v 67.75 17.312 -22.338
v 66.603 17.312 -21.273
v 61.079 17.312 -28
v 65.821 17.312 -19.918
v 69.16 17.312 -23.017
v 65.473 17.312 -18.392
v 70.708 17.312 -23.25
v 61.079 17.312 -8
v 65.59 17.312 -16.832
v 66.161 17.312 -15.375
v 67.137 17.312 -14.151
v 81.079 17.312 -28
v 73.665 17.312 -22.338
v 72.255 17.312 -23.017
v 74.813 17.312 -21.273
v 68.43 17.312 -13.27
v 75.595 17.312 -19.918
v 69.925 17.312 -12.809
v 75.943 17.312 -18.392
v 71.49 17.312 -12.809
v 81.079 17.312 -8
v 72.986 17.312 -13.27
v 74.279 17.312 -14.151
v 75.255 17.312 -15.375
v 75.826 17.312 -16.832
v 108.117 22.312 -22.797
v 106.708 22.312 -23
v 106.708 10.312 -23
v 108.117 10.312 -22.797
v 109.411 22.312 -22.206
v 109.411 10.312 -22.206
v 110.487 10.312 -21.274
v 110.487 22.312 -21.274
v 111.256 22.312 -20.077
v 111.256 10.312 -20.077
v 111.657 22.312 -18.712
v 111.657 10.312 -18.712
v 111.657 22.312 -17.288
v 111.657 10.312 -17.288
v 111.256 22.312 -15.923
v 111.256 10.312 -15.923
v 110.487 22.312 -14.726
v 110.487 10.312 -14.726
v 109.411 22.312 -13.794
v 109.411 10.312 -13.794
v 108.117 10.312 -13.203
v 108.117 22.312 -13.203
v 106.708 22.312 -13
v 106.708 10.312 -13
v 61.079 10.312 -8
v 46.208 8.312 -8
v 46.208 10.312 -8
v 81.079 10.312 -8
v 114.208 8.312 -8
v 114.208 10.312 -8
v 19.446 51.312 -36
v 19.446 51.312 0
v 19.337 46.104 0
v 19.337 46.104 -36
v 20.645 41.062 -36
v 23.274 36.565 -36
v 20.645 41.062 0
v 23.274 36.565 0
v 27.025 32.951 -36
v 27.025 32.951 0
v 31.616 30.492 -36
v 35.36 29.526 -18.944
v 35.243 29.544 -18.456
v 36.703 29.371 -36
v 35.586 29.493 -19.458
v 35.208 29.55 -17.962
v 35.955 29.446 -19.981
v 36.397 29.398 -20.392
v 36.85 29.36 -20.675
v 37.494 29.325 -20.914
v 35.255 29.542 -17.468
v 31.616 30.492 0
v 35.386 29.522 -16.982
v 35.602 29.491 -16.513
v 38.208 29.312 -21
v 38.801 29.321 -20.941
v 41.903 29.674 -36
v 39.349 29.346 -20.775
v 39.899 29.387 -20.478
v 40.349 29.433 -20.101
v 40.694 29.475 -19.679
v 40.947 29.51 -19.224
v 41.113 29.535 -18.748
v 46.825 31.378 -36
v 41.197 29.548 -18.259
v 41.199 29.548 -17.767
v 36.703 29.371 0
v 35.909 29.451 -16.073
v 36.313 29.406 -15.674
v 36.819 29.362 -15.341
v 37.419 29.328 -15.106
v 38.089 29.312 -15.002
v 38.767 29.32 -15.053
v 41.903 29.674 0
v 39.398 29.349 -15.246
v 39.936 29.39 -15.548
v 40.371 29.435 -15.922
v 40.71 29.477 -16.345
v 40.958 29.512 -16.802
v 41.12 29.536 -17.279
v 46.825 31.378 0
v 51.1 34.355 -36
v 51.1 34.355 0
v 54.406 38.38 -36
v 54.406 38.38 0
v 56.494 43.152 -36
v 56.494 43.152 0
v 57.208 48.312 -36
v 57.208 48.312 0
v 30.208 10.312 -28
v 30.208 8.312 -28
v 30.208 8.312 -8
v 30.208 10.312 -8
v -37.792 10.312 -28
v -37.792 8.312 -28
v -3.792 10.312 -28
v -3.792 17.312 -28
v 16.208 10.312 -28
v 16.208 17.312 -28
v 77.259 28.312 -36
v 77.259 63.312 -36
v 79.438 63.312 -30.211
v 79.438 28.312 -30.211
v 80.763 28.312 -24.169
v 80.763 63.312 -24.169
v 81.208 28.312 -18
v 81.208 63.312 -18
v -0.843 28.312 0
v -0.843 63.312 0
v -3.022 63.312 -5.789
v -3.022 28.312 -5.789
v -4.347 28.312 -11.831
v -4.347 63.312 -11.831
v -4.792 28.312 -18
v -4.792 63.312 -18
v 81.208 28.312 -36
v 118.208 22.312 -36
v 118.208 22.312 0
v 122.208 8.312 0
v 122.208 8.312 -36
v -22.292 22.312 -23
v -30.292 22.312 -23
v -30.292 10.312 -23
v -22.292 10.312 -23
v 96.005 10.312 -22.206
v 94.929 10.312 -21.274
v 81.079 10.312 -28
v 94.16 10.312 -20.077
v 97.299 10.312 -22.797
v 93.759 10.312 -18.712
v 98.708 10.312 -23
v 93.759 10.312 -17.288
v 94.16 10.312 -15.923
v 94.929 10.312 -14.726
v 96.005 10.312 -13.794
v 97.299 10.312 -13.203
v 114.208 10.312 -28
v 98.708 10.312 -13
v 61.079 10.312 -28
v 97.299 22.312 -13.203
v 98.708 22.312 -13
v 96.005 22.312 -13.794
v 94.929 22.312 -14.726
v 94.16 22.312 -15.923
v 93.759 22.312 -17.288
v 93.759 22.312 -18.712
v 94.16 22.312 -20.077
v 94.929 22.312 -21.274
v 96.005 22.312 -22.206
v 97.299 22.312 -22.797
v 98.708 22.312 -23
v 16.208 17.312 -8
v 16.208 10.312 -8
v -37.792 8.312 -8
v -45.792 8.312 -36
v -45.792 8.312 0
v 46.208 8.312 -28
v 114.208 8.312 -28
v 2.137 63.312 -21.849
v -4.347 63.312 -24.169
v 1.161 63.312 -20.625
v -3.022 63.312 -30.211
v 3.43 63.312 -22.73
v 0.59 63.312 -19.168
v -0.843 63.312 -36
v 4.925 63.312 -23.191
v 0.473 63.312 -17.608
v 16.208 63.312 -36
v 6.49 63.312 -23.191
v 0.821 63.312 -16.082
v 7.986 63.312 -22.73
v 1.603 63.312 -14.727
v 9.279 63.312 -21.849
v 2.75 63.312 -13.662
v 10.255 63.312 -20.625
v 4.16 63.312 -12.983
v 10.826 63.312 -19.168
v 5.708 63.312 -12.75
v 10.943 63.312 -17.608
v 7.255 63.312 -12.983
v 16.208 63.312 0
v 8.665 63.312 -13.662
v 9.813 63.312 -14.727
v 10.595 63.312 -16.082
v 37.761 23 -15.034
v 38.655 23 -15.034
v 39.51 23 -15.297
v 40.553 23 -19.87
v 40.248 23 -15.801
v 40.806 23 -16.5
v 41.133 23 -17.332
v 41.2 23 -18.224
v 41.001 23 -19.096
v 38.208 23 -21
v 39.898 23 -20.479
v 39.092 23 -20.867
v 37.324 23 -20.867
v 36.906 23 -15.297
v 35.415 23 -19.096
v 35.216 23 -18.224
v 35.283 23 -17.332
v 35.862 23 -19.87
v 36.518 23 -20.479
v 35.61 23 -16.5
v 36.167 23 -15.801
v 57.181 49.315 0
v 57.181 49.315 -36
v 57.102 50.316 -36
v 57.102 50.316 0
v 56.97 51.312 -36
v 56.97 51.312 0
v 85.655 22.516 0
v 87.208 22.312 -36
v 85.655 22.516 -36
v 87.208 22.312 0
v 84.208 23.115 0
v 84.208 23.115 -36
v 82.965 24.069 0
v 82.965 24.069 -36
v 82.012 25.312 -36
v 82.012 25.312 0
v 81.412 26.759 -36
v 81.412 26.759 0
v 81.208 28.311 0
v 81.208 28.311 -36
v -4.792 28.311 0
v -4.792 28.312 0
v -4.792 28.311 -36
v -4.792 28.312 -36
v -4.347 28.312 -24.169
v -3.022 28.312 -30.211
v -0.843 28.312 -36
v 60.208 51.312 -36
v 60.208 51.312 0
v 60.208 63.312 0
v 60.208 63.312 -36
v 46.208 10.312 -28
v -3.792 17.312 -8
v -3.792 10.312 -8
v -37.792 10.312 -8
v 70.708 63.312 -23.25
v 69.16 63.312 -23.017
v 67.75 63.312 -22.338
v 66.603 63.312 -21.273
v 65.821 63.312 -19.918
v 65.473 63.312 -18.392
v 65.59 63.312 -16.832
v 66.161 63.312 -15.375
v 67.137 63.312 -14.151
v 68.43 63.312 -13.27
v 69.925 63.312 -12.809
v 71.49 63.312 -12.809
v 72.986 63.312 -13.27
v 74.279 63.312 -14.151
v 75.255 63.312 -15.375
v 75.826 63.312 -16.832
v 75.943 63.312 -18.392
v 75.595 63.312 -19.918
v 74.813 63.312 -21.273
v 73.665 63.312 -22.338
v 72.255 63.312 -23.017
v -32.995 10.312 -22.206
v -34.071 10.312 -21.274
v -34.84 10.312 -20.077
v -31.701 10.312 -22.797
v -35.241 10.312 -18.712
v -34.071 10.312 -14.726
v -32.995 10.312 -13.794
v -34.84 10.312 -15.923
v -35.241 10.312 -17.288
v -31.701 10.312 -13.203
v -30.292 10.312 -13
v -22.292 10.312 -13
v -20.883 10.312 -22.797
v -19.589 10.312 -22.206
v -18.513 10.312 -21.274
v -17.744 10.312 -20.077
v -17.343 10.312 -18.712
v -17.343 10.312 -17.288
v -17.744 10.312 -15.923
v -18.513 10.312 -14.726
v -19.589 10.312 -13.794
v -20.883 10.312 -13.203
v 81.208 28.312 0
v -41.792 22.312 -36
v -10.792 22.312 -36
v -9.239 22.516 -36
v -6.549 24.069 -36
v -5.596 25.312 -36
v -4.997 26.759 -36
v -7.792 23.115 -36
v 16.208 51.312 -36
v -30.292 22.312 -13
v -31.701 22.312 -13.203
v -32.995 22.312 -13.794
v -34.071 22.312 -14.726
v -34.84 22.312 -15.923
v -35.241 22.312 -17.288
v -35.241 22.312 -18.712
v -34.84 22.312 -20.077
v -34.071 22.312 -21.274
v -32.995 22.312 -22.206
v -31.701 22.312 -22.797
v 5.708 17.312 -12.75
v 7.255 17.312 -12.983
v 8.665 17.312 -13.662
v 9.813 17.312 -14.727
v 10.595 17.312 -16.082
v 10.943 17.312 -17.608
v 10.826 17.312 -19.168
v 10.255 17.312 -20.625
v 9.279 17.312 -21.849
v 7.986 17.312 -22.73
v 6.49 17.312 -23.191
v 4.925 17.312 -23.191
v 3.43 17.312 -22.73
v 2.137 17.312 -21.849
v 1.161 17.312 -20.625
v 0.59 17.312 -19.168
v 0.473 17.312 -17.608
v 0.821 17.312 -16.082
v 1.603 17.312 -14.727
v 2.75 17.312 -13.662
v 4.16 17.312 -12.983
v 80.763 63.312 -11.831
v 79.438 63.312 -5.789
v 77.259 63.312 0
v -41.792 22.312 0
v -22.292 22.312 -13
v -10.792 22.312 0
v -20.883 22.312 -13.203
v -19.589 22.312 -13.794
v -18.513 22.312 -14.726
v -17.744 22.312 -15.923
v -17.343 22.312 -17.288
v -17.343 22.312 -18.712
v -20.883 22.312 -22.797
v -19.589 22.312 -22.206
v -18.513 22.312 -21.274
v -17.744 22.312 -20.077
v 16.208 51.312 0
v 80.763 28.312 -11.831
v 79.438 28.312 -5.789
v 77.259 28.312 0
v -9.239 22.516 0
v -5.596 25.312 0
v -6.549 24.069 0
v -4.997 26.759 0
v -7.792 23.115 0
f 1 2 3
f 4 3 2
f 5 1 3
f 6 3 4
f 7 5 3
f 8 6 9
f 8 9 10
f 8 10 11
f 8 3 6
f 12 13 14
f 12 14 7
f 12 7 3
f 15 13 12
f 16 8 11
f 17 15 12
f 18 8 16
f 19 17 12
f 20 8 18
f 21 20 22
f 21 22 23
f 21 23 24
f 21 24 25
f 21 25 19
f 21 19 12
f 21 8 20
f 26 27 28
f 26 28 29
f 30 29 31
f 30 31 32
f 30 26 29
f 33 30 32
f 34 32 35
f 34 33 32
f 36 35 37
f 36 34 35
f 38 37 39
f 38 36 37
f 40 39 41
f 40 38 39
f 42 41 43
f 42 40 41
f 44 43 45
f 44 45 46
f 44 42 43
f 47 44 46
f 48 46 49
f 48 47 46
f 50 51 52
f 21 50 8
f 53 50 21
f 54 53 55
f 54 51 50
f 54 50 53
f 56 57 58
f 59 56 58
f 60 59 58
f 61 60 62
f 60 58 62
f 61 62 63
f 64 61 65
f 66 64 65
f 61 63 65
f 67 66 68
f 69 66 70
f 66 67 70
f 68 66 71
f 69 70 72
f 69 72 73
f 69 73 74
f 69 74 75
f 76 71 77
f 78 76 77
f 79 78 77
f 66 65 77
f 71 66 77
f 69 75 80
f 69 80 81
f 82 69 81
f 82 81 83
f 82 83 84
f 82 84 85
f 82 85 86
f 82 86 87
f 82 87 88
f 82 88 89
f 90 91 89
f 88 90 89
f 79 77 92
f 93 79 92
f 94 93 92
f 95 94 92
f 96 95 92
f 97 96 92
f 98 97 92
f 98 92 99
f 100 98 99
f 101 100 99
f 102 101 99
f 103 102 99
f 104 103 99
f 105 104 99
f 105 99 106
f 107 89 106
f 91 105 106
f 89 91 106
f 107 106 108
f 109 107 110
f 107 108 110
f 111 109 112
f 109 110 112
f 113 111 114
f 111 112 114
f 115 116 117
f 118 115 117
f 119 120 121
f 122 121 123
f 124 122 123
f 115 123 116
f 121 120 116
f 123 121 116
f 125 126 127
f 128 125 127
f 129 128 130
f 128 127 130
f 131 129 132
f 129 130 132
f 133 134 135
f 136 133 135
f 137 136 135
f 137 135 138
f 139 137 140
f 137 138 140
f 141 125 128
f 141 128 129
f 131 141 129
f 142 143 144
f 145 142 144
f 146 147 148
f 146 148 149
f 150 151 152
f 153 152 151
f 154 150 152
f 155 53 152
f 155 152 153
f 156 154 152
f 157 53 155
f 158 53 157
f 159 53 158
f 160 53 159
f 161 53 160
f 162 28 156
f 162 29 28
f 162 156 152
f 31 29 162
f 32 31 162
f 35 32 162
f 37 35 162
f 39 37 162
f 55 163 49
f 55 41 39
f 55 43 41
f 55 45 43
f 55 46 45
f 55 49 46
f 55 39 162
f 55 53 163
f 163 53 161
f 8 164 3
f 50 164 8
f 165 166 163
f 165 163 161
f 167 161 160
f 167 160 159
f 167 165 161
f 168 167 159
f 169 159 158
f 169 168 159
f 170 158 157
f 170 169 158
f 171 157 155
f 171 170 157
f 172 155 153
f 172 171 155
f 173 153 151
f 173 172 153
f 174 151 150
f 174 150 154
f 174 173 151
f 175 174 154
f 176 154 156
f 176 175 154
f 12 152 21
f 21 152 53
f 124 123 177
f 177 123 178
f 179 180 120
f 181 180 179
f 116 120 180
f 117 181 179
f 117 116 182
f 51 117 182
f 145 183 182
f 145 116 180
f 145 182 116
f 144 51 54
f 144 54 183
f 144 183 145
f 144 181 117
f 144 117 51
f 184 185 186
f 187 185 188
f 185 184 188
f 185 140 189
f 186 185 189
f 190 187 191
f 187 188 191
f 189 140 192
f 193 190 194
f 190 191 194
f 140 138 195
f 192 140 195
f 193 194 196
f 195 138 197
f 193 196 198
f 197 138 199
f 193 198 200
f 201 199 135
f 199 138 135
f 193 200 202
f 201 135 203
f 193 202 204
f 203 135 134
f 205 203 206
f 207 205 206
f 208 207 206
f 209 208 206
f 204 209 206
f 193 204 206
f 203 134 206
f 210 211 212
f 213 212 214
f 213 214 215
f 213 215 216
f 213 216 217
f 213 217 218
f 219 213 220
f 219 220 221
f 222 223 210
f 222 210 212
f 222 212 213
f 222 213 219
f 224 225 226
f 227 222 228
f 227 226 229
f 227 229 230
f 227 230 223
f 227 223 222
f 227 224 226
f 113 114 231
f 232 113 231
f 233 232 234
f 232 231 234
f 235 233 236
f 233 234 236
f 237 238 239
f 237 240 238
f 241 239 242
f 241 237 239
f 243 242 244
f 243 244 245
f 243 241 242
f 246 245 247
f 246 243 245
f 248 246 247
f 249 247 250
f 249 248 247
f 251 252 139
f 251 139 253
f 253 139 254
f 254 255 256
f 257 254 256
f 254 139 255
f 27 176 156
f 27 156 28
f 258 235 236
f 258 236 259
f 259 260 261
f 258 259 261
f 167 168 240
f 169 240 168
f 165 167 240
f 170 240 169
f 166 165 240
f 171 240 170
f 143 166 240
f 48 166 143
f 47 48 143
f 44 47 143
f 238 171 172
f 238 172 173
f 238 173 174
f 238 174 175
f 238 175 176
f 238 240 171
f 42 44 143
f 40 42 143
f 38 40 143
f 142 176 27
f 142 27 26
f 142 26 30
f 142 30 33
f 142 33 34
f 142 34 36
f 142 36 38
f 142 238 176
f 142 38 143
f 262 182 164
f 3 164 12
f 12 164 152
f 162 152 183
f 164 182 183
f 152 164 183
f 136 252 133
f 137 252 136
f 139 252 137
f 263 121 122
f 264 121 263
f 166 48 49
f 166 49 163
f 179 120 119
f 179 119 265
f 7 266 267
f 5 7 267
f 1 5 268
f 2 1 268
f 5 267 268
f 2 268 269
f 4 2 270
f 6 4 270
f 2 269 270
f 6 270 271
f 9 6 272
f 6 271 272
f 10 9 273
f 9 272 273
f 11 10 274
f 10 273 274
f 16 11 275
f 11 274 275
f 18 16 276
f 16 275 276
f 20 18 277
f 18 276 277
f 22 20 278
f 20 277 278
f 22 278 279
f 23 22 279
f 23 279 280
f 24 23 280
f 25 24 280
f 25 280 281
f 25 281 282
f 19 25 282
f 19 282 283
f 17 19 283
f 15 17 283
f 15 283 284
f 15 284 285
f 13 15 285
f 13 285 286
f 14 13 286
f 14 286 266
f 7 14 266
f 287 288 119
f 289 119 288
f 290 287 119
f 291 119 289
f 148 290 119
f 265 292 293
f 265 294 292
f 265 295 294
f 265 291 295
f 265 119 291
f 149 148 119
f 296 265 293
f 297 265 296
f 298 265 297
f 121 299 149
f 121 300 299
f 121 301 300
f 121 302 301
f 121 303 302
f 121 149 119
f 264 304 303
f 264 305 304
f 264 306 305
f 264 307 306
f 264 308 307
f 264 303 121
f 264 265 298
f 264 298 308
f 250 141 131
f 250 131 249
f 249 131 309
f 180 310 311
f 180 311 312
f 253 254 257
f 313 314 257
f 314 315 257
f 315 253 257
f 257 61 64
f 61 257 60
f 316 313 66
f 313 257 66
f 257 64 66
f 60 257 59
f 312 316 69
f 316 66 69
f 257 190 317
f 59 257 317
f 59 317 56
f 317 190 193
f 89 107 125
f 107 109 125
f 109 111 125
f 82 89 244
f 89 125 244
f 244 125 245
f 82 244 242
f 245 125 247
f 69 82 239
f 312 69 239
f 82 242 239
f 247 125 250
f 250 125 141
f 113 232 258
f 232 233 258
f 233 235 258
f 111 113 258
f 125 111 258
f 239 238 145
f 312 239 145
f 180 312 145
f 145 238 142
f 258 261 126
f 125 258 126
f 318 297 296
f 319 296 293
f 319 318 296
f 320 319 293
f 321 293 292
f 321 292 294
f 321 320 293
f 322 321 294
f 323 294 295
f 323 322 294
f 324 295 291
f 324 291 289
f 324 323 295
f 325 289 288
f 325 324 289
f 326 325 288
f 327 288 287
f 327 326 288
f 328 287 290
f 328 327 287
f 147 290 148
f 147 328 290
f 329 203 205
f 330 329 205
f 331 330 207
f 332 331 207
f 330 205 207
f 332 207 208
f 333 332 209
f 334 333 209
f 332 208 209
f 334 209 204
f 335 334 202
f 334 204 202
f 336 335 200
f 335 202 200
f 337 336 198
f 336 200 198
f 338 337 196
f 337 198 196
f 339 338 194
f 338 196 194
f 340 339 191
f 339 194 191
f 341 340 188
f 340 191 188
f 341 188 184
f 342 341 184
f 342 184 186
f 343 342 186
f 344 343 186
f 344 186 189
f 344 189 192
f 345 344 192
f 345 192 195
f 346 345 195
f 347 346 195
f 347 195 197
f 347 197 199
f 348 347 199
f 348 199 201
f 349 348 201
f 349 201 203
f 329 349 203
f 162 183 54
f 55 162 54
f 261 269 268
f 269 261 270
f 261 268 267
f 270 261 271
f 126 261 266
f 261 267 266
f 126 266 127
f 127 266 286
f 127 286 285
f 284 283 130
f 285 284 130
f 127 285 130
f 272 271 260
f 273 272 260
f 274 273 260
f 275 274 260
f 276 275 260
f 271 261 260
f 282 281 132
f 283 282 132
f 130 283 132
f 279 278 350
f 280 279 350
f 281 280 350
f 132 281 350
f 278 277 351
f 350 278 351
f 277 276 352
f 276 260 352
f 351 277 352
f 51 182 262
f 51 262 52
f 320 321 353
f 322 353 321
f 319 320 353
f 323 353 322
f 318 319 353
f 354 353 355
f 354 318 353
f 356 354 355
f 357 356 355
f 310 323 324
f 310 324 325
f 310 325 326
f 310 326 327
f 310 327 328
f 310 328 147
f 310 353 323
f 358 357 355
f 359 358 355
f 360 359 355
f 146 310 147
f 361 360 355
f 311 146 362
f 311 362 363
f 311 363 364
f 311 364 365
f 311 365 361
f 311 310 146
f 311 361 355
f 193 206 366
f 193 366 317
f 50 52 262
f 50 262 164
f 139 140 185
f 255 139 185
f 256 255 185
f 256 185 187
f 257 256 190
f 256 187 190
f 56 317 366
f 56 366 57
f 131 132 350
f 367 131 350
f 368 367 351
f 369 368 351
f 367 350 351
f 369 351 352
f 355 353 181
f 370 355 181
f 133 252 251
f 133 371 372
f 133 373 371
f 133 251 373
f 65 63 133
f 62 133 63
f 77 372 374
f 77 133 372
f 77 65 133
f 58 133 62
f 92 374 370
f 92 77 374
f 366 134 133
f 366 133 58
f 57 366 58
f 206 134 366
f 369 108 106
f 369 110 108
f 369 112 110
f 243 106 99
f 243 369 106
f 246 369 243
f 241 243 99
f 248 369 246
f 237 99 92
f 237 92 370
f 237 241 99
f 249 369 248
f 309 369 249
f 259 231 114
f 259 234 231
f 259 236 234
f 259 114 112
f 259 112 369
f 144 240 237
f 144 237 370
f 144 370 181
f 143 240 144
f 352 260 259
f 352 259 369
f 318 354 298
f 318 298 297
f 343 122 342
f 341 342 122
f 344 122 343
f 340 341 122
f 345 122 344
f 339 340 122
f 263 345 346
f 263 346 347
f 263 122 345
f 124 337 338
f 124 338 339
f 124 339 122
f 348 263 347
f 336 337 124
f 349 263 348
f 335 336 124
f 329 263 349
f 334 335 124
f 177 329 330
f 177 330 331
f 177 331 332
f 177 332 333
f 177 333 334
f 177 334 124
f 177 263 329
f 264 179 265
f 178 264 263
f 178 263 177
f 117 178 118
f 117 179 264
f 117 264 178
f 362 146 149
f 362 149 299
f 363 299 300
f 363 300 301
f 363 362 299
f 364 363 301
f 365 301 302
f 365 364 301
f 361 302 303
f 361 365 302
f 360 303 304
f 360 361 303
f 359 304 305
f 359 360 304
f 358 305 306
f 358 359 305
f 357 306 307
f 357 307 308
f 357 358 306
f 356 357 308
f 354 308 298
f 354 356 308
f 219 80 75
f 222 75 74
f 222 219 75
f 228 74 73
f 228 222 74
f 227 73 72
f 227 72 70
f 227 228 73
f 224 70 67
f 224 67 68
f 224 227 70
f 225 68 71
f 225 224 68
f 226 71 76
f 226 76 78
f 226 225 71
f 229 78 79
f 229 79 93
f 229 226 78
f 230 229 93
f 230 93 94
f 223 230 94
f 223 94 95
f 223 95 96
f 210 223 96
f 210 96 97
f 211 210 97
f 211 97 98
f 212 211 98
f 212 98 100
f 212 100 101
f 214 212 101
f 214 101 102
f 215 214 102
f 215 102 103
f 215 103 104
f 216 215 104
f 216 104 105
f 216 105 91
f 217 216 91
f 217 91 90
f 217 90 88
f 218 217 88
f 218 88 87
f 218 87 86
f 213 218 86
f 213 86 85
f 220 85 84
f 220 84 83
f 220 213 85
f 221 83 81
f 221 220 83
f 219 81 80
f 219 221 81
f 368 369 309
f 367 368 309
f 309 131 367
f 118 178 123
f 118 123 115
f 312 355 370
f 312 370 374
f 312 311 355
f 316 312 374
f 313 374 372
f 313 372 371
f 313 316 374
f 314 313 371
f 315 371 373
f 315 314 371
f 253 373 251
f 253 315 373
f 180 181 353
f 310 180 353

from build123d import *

# Parameters (mm, degrees)
SKETCH1_W                = 168
SKETCH1_H                = 55
BOSS_EXTRUDE2_DEPTH      = 36
CUT_EXTRUDE2_DEPTH       = 41
CUT_EXTRUDE4_DEPTH       = 35
SKETCH5_W                = 44
SKETCH5_H                = 36
CUT_EXTRUDE5_DEPTH       = 12
CUT_EXTRUDE6_DEPTH       = 42
SKETCH11_R               = 5.25
CUT_EXTRUDE8_DEPTH       = 53
CUT_EXTRUDE9_DEPTH       = 46
FILLET1_R                = 6
SKETCH30_W               = 68
SKETCH30_H               = 20
CUT_EXTRUDE14_DEPTH      = 2
CUT_EXTRUDE16_DEPTH      = 6
CUT_EXTRUDE16_DEPTH_BACK = 6
SKETCH31_R               = 3
SKETCH32_W               = 20
SKETCH32_H               = 20
CUT_EXTRUDE19_DEPTH      = 7
CUT_EXTRUDE21_DEPTH      = 12


with BuildPart() as part:
    # Sketch1 → Boss-Extrude2 (new body)
    with BuildSketch(Plane.XY):
        with Locations((38.207905975, 35.811584747)):
            Rectangle(SKETCH1_W, SKETCH1_H)
    extrude(amount=-BOSS_EXTRUDE2_DEPTH)

    # Sketch3 → Cut-Extrude2 (cut)
    with BuildSketch(Plane(origin=(0, 63.311584747, 0), x_dir=(1, 0, 0), z_dir=(0, 1, 0))):
        Polygon((122.207905975, 36), (81.207905975, 36), (81.207905975, 18.000000234), (81.207905975, 0), (122.207905975, 0), align=None)
        Polygon((-4.792094025, 18), (-4.792094025, 36), (-45.792094025, 36), (-45.792094025, 0), (-4.792094025, 0), align=None)
    extrude(amount=-CUT_EXTRUDE2_DEPTH, mode=Mode.SUBTRACT)

    # Sketch4 → Cut-Extrude4 (cut)
    with BuildSketch(Plane(origin=(0, 63.311584747, 0), x_dir=(1, 0, 0), z_dir=(0, 1, 0))):
        with BuildLine():
            Line((-0.843342405, 36), (-4.792094025, 36))
            Line((-4.792094025, 36), (-4.792094025, 18))
            ThreePointArc((-4.792094025, 18), (-3.793306391, 27.214019744), (-0.843342405, 36))
        make_face()
        with BuildLine():
            ThreePointArc((-0.843342405, 0), (-3.793306391, 8.785980256), (-4.792094025, 18))
            Line((-4.792094025, 18), (-4.792094025, 0))
            Line((-4.792094025, 0), (-0.843342405, 0))
        make_face()
        with BuildLine():
            Line((81.207905975, 36), (77.259154354, 36))
            ThreePointArc((77.259154354, 36), (80.20911834, 27.214019744), (81.207905975, 18))
            Line((81.207905975, 18), (81.207905975, 36))
        make_face()
        with BuildLine():
            ThreePointArc((81.207905975, 18), (80.20911834, 8.785980256), (77.259154354, 0))
            Line((77.259154354, 0), (81.207905975, 0))
            Line((81.207905975, 0), (81.207905975, 18))
        make_face()
    extrude(amount=-CUT_EXTRUDE4_DEPTH, mode=Mode.SUBTRACT)

    # Sketch5 → Cut-Extrude5 (cut)
    with BuildSketch(Plane(origin=(0, 63.311584747, 0), x_dir=(1, 0, 0), z_dir=(0, 1, 0))):
        with Locations((38.207905975, 18)):
            Rectangle(SKETCH5_W, SKETCH5_H)
    extrude(amount=-CUT_EXTRUDE5_DEPTH, mode=Mode.SUBTRACT)

    # Sketch8 → Cut-Extrude6 (cut)
    with BuildSketch(Plane.XY):
        with BuildLine():
            ThreePointArc((19.446242935, 51.311584747), (36.703179712, 29.37126271), (57.207905975, 48.311584747))
            ThreePointArc((57.207905975, 48.311584747), (57.148228012, 49.81631101), (56.969569014, 51.311584747))
            Line((56.969569014, 51.311584747), (19.446242935, 51.311584747))
        make_face()
        with BuildLine():
            Line((19.446242935, 51.311584747), (56.969569014, 51.311584747))
            ThreePointArc((56.969569014, 51.311584747), (38.207905975, 67.311584747), (19.446242935, 51.311584747))
        make_face()
    extrude(amount=-CUT_EXTRUDE6_DEPTH, mode=Mode.SUBTRACT)

    # Sketch11 → Cut-Extrude8 (cut)
    with BuildSketch(Plane(origin=(0, 63.311584747, 0), x_dir=(1, 0, 0), z_dir=(0, 1, 0))):
        with Locations(Location((5.707905975, 18, 0), (0, 0, 270))):
            Circle(SKETCH11_R)
        with Locations(Location((70.707905975, 18, 0), (0, 0, 90))):
            Circle(SKETCH11_R)
    extrude(amount=-CUT_EXTRUDE8_DEPTH, mode=Mode.SUBTRACT)

    # Sketch13 → Cut-Extrude9 (cut)
    with BuildSketch(Plane.XY):
        Polygon((-45.792094025, 22.311584747), (-45.792094025, 8.311584747), (-41.792094025, 22.311584747), align=None)
        Polygon((122.207905975, 22.311584747), (118.207905975, 22.311584747), (122.207905975, 8.311584747), align=None)
    extrude(amount=-CUT_EXTRUDE9_DEPTH, mode=Mode.SUBTRACT)

    # Fillet1
    fillet1_edges = [part.edges().sort_by_distance(p)[0] for p in [
        (81.207905975, 22.311584747, -18),
        (-4.792094025, 22.311584747, -18),
    ]]
    fillet(fillet1_edges, radius=FILLET1_R - 0.0001)  # a hair under: the kernel refuses the full size

    # Sketch30 → Cut-Extrude14 (cut)
    with BuildSketch(Plane.XZ.offset(-8.311584747)):
        with Locations((-3.792094025, -18)):
            Rectangle(SKETCH30_W, SKETCH30_H)
        with Locations((80.207905975, -18)):
            Rectangle(SKETCH30_W, SKETCH30_H)
    extrude(amount=-CUT_EXTRUDE14_DEPTH, mode=Mode.SUBTRACT)

    # Sketch31 → Cut-Extrude16 (cut, two sides: drawn at the far end of the back side and taken through both)
    with BuildSketch(Plane(origin=(0, 29, 0), x_dir=(1, 0, 0), z_dir=(0, 1, 0)).offset(-CUT_EXTRUDE16_DEPTH_BACK)):
        with Locations(Location((38.207905975, 18, 0), (0, 0, 90))):
            Circle(SKETCH31_R)
    extrude(amount=CUT_EXTRUDE16_DEPTH + CUT_EXTRUDE16_DEPTH_BACK, mode=Mode.SUBTRACT)

    # Sketch32 → Cut-Extrude19 (cut)
    with BuildSketch(Plane.XZ.offset(-10.311584747)):
        with Locations((6.207905975, -18)):
            Rectangle(SKETCH32_W, SKETCH32_H)
        with Locations((71.078776846, -18)):
            Rectangle(SKETCH32_W, SKETCH32_H)
    extrude(amount=-CUT_EXTRUDE19_DEPTH, mode=Mode.SUBTRACT)

    # Sketch15 → Cut-Extrude21 (cut)
    with BuildSketch(Plane(origin=(0, 22.311584747, 0), x_dir=(1, 0, 0), z_dir=(0, 1, 0))):
        with BuildLine():
            Line((-30.292094025, 23), (-22.292094025, 23))
            ThreePointArc((-22.292094025, 23), (-17.292094025, 18), (-22.292094025, 13))
            Line((-22.292094025, 13), (-30.292094025, 13))
            ThreePointArc((-30.292094025, 13), (-35.292094025, 18), (-30.292094025, 23))
        make_face()
        with BuildLine():
            Line((98.707905975, 23), (106.707905975, 23))
            ThreePointArc((106.707905975, 23), (111.707905975, 18), (106.707905975, 13))
            Line((106.707905975, 13), (98.707905975, 13))
            ThreePointArc((98.707905975, 13), (93.707905975, 18), (98.707905975, 23))
        make_face()
    extrude(amount=-CUT_EXTRUDE21_DEPTH, mode=Mode.SUBTRACT)


solid = part.part
